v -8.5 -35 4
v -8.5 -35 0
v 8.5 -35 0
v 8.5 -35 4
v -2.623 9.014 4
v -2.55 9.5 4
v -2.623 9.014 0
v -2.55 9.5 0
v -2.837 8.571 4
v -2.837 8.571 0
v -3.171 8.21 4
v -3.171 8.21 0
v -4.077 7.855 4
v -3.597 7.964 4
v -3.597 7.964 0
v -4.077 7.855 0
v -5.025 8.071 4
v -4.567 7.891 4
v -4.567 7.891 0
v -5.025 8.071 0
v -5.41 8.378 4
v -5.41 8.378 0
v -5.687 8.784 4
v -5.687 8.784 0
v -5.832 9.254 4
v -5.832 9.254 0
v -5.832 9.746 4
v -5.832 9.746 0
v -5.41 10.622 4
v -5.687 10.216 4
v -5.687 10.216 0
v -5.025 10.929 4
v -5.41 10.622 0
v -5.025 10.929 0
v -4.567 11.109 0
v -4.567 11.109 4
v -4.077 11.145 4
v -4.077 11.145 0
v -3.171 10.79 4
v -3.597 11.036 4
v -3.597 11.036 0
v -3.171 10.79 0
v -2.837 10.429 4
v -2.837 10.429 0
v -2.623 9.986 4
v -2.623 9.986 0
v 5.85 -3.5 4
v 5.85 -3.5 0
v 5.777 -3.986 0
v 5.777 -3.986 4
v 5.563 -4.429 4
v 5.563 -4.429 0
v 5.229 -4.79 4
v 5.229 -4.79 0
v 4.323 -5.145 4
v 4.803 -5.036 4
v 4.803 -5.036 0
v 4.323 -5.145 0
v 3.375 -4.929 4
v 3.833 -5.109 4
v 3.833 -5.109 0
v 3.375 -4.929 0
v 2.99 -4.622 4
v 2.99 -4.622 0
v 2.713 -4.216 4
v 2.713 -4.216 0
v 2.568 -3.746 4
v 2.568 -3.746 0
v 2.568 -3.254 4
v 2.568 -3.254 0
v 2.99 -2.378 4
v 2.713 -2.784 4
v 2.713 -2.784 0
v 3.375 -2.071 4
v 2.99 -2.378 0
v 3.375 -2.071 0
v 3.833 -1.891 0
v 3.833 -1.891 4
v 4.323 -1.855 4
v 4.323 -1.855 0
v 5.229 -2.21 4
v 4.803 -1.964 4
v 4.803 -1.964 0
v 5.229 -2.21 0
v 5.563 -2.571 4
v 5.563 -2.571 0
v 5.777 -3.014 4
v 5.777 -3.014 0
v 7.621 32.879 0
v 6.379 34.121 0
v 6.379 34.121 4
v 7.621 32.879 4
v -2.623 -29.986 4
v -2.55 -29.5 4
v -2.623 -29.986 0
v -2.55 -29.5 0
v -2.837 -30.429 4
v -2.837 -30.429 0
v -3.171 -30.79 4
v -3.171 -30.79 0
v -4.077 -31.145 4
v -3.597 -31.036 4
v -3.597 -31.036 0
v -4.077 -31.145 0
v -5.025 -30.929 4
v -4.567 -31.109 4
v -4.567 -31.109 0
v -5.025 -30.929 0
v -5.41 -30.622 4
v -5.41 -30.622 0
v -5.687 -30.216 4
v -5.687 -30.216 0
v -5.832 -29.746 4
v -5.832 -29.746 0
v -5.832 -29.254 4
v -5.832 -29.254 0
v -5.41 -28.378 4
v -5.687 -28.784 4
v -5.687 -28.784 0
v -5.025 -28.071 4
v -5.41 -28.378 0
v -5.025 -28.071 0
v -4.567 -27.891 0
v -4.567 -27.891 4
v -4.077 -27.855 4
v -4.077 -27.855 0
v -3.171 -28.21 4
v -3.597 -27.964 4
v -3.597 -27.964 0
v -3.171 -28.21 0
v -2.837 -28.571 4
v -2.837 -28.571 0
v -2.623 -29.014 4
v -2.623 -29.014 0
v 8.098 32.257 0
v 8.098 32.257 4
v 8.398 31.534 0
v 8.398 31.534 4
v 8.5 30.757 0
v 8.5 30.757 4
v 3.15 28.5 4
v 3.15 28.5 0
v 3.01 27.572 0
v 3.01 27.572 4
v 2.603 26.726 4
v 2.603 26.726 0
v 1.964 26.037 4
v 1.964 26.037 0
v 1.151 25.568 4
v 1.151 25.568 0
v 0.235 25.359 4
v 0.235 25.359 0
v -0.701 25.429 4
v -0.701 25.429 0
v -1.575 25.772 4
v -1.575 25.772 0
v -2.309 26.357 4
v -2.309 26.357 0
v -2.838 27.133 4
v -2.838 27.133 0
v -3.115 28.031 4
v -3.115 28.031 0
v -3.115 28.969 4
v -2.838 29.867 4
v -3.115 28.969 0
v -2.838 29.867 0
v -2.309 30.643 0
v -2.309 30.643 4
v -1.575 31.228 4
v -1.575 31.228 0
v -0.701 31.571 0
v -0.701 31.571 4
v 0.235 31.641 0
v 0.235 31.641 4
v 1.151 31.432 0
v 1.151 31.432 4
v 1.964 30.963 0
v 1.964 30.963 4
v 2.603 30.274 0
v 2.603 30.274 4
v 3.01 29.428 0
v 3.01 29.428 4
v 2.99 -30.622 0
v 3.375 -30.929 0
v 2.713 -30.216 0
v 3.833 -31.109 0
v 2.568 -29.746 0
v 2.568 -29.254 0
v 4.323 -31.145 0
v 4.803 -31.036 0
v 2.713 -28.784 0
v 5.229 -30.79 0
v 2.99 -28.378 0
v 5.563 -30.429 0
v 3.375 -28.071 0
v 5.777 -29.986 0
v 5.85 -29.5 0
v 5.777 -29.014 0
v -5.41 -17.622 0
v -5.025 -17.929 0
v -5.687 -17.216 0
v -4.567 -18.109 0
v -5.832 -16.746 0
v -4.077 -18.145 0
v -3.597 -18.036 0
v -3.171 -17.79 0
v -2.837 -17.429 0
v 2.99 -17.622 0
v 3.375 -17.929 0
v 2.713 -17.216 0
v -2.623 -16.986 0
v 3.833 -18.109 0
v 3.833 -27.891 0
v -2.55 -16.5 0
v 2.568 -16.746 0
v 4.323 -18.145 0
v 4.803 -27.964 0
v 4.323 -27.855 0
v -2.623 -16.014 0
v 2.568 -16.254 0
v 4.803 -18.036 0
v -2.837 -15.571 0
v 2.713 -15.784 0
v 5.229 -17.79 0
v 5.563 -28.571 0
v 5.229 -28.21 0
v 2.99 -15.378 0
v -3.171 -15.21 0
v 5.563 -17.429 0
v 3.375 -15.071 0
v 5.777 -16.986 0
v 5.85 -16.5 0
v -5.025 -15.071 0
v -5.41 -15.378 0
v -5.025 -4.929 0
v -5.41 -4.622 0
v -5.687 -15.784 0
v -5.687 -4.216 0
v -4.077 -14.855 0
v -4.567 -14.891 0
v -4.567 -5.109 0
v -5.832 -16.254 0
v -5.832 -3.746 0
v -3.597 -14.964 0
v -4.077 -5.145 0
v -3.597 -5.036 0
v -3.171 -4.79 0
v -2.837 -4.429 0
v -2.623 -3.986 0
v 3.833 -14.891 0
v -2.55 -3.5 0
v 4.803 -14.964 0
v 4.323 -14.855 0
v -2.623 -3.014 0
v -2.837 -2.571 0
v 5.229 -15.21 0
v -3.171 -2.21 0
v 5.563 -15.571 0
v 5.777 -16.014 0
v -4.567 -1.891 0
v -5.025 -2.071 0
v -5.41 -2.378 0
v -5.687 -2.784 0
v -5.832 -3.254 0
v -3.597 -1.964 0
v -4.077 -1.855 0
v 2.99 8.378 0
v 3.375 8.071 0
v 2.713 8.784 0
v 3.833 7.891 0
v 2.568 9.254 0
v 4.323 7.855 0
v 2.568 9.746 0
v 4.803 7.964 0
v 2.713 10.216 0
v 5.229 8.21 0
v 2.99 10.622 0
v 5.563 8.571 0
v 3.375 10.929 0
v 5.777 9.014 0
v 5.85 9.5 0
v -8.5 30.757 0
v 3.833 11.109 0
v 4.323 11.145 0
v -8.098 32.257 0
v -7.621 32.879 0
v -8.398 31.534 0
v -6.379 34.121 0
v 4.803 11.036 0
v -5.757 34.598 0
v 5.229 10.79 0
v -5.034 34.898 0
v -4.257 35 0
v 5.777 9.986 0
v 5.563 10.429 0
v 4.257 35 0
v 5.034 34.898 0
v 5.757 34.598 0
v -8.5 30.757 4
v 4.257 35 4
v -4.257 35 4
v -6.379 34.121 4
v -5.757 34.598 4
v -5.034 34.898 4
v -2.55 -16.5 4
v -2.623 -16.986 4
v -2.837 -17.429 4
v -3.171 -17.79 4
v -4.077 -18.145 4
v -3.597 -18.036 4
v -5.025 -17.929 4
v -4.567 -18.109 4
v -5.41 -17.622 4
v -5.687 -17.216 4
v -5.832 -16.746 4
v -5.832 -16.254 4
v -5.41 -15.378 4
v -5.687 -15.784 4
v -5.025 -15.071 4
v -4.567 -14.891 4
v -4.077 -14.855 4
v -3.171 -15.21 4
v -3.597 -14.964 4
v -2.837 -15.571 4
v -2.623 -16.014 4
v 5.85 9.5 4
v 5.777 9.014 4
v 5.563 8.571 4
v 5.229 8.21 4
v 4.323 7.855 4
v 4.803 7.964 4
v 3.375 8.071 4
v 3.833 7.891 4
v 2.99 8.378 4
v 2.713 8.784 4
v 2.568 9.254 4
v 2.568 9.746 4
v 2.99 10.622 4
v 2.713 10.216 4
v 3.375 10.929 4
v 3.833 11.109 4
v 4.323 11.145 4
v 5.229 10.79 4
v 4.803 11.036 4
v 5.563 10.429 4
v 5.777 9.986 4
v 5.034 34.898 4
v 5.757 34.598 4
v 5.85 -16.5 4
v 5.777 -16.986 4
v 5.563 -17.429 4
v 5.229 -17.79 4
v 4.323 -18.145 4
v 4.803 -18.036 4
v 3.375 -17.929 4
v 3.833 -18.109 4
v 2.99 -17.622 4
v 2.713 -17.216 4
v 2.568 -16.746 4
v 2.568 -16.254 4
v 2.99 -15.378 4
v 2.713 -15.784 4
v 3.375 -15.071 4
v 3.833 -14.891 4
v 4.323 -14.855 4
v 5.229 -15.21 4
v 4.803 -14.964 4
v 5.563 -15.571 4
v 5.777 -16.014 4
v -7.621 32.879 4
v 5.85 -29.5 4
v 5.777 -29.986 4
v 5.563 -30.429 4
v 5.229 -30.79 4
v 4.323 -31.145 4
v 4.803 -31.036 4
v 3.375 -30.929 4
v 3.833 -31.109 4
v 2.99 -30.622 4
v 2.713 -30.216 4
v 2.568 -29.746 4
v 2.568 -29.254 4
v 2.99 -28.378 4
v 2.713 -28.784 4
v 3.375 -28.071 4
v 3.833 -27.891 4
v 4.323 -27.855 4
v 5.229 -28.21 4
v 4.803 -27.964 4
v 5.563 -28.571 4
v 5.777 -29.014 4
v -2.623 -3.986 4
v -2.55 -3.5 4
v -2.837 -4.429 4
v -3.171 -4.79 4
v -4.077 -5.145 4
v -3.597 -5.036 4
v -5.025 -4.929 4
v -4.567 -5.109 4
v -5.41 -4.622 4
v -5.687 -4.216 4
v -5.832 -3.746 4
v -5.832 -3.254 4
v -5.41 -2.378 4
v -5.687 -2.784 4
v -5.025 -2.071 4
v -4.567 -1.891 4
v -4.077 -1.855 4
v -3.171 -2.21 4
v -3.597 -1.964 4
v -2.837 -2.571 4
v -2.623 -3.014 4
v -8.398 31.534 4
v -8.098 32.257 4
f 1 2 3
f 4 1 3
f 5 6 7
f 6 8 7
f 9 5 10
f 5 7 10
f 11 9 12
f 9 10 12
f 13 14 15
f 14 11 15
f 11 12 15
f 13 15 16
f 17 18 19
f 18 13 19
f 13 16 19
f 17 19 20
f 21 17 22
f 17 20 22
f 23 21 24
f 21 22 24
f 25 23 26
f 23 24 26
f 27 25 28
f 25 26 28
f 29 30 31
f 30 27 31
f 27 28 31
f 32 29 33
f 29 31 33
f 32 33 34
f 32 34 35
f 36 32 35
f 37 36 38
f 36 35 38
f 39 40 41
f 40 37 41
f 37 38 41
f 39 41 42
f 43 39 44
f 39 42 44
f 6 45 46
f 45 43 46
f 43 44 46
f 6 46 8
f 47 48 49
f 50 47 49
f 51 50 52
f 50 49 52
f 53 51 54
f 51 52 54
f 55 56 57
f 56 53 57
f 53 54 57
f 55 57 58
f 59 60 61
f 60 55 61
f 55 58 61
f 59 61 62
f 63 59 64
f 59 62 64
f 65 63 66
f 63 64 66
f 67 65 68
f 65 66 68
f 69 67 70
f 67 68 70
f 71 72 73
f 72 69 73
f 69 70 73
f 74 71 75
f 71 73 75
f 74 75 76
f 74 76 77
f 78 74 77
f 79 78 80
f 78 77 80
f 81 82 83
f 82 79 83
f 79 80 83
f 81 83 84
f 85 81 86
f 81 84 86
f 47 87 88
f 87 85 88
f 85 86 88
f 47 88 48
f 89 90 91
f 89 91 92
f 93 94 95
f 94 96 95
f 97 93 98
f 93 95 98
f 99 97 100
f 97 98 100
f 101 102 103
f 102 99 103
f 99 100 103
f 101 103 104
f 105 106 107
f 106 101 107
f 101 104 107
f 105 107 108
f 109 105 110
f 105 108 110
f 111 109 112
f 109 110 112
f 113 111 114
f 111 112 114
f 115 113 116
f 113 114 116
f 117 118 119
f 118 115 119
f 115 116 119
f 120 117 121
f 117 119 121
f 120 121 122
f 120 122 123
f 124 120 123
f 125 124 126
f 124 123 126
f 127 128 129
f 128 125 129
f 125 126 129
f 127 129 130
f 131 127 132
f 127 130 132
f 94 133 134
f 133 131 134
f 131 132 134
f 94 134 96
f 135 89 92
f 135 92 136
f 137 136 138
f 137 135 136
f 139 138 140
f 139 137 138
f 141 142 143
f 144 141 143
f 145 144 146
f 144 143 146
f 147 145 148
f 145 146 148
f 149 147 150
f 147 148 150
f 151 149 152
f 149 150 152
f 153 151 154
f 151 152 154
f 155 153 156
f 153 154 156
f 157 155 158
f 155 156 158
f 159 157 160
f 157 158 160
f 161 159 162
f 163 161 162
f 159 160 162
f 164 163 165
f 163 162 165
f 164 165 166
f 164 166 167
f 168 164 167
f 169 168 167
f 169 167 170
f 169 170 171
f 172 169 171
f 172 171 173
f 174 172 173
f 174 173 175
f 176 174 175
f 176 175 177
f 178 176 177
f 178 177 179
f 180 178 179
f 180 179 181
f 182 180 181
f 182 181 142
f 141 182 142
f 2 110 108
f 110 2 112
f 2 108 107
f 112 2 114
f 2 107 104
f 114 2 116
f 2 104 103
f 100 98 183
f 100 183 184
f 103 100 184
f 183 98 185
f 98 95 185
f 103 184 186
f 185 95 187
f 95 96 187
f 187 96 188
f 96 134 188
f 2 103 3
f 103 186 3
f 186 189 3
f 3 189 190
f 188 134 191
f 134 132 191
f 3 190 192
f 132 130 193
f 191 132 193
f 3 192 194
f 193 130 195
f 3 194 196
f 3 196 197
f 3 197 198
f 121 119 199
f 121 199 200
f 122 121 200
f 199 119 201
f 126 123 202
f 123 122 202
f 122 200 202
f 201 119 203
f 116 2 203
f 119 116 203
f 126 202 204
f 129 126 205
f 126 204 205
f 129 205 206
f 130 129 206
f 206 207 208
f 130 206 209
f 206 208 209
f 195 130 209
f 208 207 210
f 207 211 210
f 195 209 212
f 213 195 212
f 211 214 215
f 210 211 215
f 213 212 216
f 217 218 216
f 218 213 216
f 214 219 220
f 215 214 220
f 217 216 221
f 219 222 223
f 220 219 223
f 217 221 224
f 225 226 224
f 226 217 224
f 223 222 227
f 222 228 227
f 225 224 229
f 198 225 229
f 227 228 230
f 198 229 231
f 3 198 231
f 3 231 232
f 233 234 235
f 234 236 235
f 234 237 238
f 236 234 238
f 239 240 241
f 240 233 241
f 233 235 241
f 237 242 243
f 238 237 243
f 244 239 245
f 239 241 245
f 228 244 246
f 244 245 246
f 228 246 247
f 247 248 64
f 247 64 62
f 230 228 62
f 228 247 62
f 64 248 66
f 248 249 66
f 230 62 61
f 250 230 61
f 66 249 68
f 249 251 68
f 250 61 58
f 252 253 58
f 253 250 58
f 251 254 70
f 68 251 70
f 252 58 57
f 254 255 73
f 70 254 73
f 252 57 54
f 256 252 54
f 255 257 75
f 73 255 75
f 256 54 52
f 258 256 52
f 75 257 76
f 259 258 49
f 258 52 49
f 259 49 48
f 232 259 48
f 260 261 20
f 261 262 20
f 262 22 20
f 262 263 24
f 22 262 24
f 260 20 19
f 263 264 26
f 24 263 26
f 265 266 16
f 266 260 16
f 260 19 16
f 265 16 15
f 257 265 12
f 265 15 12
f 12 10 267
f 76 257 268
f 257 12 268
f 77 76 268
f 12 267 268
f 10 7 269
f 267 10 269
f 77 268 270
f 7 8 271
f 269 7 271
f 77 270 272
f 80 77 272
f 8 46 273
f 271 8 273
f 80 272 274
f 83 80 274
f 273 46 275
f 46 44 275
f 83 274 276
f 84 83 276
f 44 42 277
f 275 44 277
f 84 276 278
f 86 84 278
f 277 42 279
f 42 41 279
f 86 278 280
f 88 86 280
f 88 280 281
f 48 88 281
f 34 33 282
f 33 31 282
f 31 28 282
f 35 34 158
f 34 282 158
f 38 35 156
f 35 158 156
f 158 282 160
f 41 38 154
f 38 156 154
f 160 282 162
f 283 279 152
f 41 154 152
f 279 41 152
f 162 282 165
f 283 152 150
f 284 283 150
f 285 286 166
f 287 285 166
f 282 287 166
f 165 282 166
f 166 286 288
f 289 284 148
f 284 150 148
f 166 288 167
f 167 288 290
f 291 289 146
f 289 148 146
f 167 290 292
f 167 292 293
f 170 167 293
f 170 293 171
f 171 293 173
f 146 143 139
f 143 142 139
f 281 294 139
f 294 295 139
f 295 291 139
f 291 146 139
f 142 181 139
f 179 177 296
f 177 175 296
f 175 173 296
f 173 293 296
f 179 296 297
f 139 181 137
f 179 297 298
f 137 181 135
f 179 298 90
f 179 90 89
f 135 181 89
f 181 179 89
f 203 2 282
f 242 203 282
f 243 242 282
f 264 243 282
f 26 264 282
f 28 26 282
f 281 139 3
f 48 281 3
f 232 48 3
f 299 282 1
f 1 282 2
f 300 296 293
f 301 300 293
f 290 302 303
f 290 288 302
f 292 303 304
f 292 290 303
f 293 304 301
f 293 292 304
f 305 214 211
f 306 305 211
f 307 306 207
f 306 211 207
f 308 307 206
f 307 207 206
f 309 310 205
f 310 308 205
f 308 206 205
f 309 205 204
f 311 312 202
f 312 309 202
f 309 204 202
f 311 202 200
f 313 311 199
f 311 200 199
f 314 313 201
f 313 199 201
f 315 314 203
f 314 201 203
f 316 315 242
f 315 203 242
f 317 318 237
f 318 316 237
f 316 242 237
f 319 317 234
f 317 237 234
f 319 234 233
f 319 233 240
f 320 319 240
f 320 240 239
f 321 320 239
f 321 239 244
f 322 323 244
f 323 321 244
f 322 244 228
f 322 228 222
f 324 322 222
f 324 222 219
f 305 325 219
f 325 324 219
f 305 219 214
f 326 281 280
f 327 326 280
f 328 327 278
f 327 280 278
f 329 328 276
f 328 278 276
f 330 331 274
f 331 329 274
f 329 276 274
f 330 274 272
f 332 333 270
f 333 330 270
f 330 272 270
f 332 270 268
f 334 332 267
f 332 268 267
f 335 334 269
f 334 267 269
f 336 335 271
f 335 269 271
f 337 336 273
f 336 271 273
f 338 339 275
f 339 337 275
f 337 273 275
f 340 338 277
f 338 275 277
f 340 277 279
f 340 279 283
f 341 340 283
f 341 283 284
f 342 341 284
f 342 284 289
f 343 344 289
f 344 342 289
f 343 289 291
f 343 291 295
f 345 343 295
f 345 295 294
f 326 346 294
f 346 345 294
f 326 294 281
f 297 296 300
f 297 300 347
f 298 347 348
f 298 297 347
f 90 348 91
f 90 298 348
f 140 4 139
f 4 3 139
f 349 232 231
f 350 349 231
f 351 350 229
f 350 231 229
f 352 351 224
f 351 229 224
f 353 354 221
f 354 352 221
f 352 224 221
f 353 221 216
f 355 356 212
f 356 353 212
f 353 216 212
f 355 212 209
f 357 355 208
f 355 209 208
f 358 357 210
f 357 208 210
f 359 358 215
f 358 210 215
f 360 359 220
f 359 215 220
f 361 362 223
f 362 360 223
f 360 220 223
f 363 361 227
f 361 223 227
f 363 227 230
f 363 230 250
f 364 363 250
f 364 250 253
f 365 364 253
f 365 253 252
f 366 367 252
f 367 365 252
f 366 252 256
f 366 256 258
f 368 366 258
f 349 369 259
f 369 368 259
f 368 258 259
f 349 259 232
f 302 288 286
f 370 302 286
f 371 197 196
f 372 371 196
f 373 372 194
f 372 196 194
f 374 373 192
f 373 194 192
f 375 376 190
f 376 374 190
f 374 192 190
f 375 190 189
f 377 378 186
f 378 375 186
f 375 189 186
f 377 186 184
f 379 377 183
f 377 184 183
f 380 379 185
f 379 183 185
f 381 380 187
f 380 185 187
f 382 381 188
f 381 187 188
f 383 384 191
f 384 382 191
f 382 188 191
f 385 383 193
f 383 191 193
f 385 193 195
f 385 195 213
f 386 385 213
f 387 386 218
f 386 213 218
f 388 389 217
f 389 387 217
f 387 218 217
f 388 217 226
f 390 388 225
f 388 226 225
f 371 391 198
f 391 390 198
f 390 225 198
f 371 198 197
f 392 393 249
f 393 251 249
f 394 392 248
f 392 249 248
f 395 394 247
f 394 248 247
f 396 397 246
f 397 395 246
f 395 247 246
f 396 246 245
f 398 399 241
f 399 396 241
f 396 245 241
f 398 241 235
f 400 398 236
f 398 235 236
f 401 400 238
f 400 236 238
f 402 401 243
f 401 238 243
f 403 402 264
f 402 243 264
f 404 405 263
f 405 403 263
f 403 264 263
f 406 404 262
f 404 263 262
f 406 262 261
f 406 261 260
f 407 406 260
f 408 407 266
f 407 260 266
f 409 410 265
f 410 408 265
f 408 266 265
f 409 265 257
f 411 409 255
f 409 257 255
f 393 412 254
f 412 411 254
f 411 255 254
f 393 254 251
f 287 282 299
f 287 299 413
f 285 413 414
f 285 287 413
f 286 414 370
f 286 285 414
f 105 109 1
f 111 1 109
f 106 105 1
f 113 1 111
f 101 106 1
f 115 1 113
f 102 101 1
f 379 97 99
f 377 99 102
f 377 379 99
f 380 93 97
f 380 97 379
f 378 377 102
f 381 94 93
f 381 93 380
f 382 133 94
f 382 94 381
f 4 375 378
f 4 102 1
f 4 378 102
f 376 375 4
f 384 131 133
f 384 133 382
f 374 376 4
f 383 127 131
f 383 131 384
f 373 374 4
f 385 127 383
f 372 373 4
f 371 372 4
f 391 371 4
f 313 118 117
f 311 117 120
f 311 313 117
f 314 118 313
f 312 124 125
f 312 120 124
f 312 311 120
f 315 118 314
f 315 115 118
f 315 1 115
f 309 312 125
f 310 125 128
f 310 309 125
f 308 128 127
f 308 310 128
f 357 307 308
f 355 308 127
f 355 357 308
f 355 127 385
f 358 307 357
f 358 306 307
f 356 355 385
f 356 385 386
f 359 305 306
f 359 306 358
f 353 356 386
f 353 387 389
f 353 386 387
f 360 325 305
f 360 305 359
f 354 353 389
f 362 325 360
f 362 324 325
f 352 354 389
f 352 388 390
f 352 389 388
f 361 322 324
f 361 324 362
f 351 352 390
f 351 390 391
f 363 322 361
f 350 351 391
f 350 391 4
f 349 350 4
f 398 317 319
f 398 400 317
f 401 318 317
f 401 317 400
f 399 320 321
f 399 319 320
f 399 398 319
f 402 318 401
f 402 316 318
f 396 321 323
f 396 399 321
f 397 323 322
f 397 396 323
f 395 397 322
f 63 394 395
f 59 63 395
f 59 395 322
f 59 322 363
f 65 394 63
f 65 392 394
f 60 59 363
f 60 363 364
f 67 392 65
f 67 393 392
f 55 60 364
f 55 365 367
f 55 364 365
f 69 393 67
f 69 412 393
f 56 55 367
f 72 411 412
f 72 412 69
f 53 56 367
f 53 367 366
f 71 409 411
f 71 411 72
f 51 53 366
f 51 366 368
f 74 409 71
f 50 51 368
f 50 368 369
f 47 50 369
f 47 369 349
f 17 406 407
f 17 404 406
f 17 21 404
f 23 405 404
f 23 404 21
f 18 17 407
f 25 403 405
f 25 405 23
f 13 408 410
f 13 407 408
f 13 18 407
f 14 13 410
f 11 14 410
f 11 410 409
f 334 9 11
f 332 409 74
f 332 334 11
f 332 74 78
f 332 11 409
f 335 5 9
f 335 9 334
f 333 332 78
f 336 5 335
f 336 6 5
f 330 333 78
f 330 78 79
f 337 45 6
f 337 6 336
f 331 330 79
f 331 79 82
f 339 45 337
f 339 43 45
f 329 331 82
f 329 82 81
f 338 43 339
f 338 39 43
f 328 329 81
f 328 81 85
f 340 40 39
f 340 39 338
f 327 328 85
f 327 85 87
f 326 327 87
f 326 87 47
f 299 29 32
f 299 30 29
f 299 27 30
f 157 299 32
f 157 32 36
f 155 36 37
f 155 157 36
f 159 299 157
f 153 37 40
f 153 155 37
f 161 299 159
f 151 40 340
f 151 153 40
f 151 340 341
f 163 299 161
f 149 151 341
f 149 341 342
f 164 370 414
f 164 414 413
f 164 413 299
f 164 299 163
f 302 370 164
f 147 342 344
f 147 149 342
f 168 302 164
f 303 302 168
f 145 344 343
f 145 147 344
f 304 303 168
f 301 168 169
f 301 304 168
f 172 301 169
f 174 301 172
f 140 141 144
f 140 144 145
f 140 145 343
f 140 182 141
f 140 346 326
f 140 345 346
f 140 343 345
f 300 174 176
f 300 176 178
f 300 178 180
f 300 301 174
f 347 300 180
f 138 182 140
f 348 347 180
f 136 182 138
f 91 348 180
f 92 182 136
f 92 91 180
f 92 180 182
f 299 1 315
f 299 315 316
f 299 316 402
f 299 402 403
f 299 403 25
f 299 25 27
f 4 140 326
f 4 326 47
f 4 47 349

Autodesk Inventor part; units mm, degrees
ref_plane "YZ Plane" through (0, 0, 0) normal (1, 0, 0) x (0, 1, 0)
ref_plane "XZ Plane" through (0, 0, 0) normal (0, 1, 0) x (-1, 0, 0)
ref_plane "XY Plane" through (0, 0, 0) normal (0, 0, 1) x (1, 0, 0)
sketch "Skizze1" plane through (0, 0, 0) normal (0, 0, 1) x (1, 0, 0)
  line L0 (-8.5, -35) -> (8.5, -35)
  line L1 (8.5, -35) -> (8.5, 30.7574)
  line L2 (4.2574, 35) -> (-4.2574, 35)
  line L3 (-8.5, 30.7574) -> (-8.5, -35)
  line L4 (-12.1954, 0) -> (12.1954, 0) projected
  line L5 (0, -49.0422) -> (0, 49.2532) projected
  circle A0 centre (0, 28.5) radius 3.15
  circle A1 centre (-4.2, -29.5) radius 1.65
  circle A2 centre (4.2, -29.5) radius 1.65
  circle A3 centre (-4.2, -16.5) radius 1.65
  circle A4 centre (4.2, -16.5) radius 1.65
  circle A5 centre (-4.2, -3.5) radius 1.65
  circle A6 centre (4.2, -3.5) radius 1.65
  circle A7 centre (-4.2, 9.5) radius 1.65
  circle A8 centre (4.2, 9.5) radius 1.65
  line L6 (-6.3787, 34.1213) -> (-7.6213, 32.8787)
  line L7 (6.3787, 34.1213) -> (7.6213, 32.8787)
  arc A9 (8.5, 30.7574) -> (7.6213, 32.8787) centre (5.5, 30.7574) ccw
  arc A10 (6.3787, 34.1213) -> (4.2574, 35) centre (4.2574, 32) ccw
  arc A11 (-4.2574, 35) -> (-6.3787, 34.1213) centre (-4.2574, 32) ccw
  arc A12 (-7.6213, 32.8787) -> (-8.5, 30.7574) centre (-5.5, 30.7574) ccw
  point P0 (0, 0)
  point P1 (8.5, 35)
  point P2 (-8.5, 35)
  point P3 (-5.5, 35)
  point P4 (-8.5, 32)
  point P5 (5.5, 35)
  point P6 (8.5, 32)
  dimension "d0" = 17
  dimension "d1" = 70
  dimension "d2" = 6.3
  dimension "d3" = 6.5
  dimension "d4" = 3.3
  dimension "d5" = 3.3
  dimension "d6" = 3.3
  dimension "d7" = 3.3
  dimension "d8" = 3.3
  dimension "d9" = 3.3
  dimension "d10" = 3.3
  dimension "d11" = 3.3
  dimension "d12" = 4.3
  dimension "d13" = 8.4
  dimension "d14" = 5.5
  dimension "d15" = 13
  dimension "d16" = 13
  dimension "d17" = 13
  dimension "d18" = 3
  dimension "d19" = 3
  dimension "d20" = 3
  dimension "d21" = 3
  dimension "d24" = 3
extrude "Extrusion1" add sketch "Skizze1" along normal blind 4 contours L3 L4 L5 L0 | L5 L4 L1 L0 | L3 A12 L6 A11 L2 L5 A0 L4 | L5 A0 L2 A10 L7 A9 L1 L4
equation "\"d4\" = d5"
equation "\"d6\" = d5"
equation "\"d7\" = d5"
equation "\"d8\" = d5"
equation "\"d9\" = d5"
equation "\"d10\" = d5"
equation "\"d11\" = d5"
equation "\"d19\" = d18"
equation "\"d20\" = d18"
equation "\"d21\" = d20"
properties part number "Part2_new" material "Aluminium 6061"
